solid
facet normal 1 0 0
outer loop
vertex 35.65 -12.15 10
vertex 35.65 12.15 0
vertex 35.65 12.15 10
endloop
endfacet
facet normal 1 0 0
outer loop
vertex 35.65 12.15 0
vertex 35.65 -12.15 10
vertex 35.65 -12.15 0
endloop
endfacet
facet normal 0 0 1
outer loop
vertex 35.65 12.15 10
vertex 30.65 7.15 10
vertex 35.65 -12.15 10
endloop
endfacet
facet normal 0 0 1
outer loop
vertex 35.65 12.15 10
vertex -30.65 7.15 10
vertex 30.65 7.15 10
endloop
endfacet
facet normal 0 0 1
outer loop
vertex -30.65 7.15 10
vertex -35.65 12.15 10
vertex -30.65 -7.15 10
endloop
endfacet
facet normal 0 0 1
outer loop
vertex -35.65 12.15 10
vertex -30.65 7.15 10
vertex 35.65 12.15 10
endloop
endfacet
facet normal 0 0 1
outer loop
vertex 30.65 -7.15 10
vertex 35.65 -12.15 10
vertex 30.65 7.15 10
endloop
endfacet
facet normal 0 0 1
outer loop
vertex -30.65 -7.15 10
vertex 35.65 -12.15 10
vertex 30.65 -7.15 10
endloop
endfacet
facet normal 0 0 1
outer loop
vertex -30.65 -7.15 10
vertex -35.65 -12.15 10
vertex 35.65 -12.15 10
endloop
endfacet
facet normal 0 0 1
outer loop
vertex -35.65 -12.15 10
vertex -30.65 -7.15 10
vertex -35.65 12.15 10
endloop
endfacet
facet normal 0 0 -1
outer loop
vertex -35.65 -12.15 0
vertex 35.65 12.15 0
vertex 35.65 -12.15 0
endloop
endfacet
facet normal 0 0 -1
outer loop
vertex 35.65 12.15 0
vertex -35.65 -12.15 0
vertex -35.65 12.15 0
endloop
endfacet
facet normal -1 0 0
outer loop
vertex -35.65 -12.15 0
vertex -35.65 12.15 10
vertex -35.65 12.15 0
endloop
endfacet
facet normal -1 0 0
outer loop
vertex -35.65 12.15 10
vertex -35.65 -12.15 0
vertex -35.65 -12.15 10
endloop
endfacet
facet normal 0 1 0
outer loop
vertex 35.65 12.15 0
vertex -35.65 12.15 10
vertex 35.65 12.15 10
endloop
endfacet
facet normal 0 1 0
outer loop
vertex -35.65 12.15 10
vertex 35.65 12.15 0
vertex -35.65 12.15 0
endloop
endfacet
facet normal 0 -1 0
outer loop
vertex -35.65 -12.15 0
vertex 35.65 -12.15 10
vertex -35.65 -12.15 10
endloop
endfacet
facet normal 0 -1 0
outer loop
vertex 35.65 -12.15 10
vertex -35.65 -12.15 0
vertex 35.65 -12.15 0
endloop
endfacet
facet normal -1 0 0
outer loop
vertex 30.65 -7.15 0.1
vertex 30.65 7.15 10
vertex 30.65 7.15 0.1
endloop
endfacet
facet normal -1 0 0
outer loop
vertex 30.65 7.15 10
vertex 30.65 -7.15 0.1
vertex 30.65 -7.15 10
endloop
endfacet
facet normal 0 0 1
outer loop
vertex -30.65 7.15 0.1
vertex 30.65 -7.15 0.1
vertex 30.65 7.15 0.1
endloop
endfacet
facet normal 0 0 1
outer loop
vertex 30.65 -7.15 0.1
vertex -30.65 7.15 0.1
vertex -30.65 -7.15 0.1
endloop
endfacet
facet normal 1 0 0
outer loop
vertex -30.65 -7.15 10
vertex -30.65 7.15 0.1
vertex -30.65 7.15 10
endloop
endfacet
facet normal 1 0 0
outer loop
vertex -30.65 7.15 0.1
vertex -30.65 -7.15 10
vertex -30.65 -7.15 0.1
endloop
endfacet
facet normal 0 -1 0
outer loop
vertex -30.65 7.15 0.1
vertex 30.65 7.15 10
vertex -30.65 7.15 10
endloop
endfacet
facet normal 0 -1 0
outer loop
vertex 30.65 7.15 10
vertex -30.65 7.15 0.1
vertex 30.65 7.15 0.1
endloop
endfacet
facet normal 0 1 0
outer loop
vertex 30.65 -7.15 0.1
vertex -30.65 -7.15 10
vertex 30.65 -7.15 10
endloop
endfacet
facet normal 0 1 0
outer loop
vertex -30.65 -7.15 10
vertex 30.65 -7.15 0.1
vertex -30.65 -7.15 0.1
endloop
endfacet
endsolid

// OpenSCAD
module lcd_display() {
    difference() {
        // Main body of the display
        translate([-71.3/2, -24.3/2, 0])
            cube([71.3, 24.3, 10]);

        // Cutout for the screen
        translate([-61.3/2, -14.3/2, 0.1])
            cube([61.3, 14.3, 10.1]);
    }
}

lcd_display();
